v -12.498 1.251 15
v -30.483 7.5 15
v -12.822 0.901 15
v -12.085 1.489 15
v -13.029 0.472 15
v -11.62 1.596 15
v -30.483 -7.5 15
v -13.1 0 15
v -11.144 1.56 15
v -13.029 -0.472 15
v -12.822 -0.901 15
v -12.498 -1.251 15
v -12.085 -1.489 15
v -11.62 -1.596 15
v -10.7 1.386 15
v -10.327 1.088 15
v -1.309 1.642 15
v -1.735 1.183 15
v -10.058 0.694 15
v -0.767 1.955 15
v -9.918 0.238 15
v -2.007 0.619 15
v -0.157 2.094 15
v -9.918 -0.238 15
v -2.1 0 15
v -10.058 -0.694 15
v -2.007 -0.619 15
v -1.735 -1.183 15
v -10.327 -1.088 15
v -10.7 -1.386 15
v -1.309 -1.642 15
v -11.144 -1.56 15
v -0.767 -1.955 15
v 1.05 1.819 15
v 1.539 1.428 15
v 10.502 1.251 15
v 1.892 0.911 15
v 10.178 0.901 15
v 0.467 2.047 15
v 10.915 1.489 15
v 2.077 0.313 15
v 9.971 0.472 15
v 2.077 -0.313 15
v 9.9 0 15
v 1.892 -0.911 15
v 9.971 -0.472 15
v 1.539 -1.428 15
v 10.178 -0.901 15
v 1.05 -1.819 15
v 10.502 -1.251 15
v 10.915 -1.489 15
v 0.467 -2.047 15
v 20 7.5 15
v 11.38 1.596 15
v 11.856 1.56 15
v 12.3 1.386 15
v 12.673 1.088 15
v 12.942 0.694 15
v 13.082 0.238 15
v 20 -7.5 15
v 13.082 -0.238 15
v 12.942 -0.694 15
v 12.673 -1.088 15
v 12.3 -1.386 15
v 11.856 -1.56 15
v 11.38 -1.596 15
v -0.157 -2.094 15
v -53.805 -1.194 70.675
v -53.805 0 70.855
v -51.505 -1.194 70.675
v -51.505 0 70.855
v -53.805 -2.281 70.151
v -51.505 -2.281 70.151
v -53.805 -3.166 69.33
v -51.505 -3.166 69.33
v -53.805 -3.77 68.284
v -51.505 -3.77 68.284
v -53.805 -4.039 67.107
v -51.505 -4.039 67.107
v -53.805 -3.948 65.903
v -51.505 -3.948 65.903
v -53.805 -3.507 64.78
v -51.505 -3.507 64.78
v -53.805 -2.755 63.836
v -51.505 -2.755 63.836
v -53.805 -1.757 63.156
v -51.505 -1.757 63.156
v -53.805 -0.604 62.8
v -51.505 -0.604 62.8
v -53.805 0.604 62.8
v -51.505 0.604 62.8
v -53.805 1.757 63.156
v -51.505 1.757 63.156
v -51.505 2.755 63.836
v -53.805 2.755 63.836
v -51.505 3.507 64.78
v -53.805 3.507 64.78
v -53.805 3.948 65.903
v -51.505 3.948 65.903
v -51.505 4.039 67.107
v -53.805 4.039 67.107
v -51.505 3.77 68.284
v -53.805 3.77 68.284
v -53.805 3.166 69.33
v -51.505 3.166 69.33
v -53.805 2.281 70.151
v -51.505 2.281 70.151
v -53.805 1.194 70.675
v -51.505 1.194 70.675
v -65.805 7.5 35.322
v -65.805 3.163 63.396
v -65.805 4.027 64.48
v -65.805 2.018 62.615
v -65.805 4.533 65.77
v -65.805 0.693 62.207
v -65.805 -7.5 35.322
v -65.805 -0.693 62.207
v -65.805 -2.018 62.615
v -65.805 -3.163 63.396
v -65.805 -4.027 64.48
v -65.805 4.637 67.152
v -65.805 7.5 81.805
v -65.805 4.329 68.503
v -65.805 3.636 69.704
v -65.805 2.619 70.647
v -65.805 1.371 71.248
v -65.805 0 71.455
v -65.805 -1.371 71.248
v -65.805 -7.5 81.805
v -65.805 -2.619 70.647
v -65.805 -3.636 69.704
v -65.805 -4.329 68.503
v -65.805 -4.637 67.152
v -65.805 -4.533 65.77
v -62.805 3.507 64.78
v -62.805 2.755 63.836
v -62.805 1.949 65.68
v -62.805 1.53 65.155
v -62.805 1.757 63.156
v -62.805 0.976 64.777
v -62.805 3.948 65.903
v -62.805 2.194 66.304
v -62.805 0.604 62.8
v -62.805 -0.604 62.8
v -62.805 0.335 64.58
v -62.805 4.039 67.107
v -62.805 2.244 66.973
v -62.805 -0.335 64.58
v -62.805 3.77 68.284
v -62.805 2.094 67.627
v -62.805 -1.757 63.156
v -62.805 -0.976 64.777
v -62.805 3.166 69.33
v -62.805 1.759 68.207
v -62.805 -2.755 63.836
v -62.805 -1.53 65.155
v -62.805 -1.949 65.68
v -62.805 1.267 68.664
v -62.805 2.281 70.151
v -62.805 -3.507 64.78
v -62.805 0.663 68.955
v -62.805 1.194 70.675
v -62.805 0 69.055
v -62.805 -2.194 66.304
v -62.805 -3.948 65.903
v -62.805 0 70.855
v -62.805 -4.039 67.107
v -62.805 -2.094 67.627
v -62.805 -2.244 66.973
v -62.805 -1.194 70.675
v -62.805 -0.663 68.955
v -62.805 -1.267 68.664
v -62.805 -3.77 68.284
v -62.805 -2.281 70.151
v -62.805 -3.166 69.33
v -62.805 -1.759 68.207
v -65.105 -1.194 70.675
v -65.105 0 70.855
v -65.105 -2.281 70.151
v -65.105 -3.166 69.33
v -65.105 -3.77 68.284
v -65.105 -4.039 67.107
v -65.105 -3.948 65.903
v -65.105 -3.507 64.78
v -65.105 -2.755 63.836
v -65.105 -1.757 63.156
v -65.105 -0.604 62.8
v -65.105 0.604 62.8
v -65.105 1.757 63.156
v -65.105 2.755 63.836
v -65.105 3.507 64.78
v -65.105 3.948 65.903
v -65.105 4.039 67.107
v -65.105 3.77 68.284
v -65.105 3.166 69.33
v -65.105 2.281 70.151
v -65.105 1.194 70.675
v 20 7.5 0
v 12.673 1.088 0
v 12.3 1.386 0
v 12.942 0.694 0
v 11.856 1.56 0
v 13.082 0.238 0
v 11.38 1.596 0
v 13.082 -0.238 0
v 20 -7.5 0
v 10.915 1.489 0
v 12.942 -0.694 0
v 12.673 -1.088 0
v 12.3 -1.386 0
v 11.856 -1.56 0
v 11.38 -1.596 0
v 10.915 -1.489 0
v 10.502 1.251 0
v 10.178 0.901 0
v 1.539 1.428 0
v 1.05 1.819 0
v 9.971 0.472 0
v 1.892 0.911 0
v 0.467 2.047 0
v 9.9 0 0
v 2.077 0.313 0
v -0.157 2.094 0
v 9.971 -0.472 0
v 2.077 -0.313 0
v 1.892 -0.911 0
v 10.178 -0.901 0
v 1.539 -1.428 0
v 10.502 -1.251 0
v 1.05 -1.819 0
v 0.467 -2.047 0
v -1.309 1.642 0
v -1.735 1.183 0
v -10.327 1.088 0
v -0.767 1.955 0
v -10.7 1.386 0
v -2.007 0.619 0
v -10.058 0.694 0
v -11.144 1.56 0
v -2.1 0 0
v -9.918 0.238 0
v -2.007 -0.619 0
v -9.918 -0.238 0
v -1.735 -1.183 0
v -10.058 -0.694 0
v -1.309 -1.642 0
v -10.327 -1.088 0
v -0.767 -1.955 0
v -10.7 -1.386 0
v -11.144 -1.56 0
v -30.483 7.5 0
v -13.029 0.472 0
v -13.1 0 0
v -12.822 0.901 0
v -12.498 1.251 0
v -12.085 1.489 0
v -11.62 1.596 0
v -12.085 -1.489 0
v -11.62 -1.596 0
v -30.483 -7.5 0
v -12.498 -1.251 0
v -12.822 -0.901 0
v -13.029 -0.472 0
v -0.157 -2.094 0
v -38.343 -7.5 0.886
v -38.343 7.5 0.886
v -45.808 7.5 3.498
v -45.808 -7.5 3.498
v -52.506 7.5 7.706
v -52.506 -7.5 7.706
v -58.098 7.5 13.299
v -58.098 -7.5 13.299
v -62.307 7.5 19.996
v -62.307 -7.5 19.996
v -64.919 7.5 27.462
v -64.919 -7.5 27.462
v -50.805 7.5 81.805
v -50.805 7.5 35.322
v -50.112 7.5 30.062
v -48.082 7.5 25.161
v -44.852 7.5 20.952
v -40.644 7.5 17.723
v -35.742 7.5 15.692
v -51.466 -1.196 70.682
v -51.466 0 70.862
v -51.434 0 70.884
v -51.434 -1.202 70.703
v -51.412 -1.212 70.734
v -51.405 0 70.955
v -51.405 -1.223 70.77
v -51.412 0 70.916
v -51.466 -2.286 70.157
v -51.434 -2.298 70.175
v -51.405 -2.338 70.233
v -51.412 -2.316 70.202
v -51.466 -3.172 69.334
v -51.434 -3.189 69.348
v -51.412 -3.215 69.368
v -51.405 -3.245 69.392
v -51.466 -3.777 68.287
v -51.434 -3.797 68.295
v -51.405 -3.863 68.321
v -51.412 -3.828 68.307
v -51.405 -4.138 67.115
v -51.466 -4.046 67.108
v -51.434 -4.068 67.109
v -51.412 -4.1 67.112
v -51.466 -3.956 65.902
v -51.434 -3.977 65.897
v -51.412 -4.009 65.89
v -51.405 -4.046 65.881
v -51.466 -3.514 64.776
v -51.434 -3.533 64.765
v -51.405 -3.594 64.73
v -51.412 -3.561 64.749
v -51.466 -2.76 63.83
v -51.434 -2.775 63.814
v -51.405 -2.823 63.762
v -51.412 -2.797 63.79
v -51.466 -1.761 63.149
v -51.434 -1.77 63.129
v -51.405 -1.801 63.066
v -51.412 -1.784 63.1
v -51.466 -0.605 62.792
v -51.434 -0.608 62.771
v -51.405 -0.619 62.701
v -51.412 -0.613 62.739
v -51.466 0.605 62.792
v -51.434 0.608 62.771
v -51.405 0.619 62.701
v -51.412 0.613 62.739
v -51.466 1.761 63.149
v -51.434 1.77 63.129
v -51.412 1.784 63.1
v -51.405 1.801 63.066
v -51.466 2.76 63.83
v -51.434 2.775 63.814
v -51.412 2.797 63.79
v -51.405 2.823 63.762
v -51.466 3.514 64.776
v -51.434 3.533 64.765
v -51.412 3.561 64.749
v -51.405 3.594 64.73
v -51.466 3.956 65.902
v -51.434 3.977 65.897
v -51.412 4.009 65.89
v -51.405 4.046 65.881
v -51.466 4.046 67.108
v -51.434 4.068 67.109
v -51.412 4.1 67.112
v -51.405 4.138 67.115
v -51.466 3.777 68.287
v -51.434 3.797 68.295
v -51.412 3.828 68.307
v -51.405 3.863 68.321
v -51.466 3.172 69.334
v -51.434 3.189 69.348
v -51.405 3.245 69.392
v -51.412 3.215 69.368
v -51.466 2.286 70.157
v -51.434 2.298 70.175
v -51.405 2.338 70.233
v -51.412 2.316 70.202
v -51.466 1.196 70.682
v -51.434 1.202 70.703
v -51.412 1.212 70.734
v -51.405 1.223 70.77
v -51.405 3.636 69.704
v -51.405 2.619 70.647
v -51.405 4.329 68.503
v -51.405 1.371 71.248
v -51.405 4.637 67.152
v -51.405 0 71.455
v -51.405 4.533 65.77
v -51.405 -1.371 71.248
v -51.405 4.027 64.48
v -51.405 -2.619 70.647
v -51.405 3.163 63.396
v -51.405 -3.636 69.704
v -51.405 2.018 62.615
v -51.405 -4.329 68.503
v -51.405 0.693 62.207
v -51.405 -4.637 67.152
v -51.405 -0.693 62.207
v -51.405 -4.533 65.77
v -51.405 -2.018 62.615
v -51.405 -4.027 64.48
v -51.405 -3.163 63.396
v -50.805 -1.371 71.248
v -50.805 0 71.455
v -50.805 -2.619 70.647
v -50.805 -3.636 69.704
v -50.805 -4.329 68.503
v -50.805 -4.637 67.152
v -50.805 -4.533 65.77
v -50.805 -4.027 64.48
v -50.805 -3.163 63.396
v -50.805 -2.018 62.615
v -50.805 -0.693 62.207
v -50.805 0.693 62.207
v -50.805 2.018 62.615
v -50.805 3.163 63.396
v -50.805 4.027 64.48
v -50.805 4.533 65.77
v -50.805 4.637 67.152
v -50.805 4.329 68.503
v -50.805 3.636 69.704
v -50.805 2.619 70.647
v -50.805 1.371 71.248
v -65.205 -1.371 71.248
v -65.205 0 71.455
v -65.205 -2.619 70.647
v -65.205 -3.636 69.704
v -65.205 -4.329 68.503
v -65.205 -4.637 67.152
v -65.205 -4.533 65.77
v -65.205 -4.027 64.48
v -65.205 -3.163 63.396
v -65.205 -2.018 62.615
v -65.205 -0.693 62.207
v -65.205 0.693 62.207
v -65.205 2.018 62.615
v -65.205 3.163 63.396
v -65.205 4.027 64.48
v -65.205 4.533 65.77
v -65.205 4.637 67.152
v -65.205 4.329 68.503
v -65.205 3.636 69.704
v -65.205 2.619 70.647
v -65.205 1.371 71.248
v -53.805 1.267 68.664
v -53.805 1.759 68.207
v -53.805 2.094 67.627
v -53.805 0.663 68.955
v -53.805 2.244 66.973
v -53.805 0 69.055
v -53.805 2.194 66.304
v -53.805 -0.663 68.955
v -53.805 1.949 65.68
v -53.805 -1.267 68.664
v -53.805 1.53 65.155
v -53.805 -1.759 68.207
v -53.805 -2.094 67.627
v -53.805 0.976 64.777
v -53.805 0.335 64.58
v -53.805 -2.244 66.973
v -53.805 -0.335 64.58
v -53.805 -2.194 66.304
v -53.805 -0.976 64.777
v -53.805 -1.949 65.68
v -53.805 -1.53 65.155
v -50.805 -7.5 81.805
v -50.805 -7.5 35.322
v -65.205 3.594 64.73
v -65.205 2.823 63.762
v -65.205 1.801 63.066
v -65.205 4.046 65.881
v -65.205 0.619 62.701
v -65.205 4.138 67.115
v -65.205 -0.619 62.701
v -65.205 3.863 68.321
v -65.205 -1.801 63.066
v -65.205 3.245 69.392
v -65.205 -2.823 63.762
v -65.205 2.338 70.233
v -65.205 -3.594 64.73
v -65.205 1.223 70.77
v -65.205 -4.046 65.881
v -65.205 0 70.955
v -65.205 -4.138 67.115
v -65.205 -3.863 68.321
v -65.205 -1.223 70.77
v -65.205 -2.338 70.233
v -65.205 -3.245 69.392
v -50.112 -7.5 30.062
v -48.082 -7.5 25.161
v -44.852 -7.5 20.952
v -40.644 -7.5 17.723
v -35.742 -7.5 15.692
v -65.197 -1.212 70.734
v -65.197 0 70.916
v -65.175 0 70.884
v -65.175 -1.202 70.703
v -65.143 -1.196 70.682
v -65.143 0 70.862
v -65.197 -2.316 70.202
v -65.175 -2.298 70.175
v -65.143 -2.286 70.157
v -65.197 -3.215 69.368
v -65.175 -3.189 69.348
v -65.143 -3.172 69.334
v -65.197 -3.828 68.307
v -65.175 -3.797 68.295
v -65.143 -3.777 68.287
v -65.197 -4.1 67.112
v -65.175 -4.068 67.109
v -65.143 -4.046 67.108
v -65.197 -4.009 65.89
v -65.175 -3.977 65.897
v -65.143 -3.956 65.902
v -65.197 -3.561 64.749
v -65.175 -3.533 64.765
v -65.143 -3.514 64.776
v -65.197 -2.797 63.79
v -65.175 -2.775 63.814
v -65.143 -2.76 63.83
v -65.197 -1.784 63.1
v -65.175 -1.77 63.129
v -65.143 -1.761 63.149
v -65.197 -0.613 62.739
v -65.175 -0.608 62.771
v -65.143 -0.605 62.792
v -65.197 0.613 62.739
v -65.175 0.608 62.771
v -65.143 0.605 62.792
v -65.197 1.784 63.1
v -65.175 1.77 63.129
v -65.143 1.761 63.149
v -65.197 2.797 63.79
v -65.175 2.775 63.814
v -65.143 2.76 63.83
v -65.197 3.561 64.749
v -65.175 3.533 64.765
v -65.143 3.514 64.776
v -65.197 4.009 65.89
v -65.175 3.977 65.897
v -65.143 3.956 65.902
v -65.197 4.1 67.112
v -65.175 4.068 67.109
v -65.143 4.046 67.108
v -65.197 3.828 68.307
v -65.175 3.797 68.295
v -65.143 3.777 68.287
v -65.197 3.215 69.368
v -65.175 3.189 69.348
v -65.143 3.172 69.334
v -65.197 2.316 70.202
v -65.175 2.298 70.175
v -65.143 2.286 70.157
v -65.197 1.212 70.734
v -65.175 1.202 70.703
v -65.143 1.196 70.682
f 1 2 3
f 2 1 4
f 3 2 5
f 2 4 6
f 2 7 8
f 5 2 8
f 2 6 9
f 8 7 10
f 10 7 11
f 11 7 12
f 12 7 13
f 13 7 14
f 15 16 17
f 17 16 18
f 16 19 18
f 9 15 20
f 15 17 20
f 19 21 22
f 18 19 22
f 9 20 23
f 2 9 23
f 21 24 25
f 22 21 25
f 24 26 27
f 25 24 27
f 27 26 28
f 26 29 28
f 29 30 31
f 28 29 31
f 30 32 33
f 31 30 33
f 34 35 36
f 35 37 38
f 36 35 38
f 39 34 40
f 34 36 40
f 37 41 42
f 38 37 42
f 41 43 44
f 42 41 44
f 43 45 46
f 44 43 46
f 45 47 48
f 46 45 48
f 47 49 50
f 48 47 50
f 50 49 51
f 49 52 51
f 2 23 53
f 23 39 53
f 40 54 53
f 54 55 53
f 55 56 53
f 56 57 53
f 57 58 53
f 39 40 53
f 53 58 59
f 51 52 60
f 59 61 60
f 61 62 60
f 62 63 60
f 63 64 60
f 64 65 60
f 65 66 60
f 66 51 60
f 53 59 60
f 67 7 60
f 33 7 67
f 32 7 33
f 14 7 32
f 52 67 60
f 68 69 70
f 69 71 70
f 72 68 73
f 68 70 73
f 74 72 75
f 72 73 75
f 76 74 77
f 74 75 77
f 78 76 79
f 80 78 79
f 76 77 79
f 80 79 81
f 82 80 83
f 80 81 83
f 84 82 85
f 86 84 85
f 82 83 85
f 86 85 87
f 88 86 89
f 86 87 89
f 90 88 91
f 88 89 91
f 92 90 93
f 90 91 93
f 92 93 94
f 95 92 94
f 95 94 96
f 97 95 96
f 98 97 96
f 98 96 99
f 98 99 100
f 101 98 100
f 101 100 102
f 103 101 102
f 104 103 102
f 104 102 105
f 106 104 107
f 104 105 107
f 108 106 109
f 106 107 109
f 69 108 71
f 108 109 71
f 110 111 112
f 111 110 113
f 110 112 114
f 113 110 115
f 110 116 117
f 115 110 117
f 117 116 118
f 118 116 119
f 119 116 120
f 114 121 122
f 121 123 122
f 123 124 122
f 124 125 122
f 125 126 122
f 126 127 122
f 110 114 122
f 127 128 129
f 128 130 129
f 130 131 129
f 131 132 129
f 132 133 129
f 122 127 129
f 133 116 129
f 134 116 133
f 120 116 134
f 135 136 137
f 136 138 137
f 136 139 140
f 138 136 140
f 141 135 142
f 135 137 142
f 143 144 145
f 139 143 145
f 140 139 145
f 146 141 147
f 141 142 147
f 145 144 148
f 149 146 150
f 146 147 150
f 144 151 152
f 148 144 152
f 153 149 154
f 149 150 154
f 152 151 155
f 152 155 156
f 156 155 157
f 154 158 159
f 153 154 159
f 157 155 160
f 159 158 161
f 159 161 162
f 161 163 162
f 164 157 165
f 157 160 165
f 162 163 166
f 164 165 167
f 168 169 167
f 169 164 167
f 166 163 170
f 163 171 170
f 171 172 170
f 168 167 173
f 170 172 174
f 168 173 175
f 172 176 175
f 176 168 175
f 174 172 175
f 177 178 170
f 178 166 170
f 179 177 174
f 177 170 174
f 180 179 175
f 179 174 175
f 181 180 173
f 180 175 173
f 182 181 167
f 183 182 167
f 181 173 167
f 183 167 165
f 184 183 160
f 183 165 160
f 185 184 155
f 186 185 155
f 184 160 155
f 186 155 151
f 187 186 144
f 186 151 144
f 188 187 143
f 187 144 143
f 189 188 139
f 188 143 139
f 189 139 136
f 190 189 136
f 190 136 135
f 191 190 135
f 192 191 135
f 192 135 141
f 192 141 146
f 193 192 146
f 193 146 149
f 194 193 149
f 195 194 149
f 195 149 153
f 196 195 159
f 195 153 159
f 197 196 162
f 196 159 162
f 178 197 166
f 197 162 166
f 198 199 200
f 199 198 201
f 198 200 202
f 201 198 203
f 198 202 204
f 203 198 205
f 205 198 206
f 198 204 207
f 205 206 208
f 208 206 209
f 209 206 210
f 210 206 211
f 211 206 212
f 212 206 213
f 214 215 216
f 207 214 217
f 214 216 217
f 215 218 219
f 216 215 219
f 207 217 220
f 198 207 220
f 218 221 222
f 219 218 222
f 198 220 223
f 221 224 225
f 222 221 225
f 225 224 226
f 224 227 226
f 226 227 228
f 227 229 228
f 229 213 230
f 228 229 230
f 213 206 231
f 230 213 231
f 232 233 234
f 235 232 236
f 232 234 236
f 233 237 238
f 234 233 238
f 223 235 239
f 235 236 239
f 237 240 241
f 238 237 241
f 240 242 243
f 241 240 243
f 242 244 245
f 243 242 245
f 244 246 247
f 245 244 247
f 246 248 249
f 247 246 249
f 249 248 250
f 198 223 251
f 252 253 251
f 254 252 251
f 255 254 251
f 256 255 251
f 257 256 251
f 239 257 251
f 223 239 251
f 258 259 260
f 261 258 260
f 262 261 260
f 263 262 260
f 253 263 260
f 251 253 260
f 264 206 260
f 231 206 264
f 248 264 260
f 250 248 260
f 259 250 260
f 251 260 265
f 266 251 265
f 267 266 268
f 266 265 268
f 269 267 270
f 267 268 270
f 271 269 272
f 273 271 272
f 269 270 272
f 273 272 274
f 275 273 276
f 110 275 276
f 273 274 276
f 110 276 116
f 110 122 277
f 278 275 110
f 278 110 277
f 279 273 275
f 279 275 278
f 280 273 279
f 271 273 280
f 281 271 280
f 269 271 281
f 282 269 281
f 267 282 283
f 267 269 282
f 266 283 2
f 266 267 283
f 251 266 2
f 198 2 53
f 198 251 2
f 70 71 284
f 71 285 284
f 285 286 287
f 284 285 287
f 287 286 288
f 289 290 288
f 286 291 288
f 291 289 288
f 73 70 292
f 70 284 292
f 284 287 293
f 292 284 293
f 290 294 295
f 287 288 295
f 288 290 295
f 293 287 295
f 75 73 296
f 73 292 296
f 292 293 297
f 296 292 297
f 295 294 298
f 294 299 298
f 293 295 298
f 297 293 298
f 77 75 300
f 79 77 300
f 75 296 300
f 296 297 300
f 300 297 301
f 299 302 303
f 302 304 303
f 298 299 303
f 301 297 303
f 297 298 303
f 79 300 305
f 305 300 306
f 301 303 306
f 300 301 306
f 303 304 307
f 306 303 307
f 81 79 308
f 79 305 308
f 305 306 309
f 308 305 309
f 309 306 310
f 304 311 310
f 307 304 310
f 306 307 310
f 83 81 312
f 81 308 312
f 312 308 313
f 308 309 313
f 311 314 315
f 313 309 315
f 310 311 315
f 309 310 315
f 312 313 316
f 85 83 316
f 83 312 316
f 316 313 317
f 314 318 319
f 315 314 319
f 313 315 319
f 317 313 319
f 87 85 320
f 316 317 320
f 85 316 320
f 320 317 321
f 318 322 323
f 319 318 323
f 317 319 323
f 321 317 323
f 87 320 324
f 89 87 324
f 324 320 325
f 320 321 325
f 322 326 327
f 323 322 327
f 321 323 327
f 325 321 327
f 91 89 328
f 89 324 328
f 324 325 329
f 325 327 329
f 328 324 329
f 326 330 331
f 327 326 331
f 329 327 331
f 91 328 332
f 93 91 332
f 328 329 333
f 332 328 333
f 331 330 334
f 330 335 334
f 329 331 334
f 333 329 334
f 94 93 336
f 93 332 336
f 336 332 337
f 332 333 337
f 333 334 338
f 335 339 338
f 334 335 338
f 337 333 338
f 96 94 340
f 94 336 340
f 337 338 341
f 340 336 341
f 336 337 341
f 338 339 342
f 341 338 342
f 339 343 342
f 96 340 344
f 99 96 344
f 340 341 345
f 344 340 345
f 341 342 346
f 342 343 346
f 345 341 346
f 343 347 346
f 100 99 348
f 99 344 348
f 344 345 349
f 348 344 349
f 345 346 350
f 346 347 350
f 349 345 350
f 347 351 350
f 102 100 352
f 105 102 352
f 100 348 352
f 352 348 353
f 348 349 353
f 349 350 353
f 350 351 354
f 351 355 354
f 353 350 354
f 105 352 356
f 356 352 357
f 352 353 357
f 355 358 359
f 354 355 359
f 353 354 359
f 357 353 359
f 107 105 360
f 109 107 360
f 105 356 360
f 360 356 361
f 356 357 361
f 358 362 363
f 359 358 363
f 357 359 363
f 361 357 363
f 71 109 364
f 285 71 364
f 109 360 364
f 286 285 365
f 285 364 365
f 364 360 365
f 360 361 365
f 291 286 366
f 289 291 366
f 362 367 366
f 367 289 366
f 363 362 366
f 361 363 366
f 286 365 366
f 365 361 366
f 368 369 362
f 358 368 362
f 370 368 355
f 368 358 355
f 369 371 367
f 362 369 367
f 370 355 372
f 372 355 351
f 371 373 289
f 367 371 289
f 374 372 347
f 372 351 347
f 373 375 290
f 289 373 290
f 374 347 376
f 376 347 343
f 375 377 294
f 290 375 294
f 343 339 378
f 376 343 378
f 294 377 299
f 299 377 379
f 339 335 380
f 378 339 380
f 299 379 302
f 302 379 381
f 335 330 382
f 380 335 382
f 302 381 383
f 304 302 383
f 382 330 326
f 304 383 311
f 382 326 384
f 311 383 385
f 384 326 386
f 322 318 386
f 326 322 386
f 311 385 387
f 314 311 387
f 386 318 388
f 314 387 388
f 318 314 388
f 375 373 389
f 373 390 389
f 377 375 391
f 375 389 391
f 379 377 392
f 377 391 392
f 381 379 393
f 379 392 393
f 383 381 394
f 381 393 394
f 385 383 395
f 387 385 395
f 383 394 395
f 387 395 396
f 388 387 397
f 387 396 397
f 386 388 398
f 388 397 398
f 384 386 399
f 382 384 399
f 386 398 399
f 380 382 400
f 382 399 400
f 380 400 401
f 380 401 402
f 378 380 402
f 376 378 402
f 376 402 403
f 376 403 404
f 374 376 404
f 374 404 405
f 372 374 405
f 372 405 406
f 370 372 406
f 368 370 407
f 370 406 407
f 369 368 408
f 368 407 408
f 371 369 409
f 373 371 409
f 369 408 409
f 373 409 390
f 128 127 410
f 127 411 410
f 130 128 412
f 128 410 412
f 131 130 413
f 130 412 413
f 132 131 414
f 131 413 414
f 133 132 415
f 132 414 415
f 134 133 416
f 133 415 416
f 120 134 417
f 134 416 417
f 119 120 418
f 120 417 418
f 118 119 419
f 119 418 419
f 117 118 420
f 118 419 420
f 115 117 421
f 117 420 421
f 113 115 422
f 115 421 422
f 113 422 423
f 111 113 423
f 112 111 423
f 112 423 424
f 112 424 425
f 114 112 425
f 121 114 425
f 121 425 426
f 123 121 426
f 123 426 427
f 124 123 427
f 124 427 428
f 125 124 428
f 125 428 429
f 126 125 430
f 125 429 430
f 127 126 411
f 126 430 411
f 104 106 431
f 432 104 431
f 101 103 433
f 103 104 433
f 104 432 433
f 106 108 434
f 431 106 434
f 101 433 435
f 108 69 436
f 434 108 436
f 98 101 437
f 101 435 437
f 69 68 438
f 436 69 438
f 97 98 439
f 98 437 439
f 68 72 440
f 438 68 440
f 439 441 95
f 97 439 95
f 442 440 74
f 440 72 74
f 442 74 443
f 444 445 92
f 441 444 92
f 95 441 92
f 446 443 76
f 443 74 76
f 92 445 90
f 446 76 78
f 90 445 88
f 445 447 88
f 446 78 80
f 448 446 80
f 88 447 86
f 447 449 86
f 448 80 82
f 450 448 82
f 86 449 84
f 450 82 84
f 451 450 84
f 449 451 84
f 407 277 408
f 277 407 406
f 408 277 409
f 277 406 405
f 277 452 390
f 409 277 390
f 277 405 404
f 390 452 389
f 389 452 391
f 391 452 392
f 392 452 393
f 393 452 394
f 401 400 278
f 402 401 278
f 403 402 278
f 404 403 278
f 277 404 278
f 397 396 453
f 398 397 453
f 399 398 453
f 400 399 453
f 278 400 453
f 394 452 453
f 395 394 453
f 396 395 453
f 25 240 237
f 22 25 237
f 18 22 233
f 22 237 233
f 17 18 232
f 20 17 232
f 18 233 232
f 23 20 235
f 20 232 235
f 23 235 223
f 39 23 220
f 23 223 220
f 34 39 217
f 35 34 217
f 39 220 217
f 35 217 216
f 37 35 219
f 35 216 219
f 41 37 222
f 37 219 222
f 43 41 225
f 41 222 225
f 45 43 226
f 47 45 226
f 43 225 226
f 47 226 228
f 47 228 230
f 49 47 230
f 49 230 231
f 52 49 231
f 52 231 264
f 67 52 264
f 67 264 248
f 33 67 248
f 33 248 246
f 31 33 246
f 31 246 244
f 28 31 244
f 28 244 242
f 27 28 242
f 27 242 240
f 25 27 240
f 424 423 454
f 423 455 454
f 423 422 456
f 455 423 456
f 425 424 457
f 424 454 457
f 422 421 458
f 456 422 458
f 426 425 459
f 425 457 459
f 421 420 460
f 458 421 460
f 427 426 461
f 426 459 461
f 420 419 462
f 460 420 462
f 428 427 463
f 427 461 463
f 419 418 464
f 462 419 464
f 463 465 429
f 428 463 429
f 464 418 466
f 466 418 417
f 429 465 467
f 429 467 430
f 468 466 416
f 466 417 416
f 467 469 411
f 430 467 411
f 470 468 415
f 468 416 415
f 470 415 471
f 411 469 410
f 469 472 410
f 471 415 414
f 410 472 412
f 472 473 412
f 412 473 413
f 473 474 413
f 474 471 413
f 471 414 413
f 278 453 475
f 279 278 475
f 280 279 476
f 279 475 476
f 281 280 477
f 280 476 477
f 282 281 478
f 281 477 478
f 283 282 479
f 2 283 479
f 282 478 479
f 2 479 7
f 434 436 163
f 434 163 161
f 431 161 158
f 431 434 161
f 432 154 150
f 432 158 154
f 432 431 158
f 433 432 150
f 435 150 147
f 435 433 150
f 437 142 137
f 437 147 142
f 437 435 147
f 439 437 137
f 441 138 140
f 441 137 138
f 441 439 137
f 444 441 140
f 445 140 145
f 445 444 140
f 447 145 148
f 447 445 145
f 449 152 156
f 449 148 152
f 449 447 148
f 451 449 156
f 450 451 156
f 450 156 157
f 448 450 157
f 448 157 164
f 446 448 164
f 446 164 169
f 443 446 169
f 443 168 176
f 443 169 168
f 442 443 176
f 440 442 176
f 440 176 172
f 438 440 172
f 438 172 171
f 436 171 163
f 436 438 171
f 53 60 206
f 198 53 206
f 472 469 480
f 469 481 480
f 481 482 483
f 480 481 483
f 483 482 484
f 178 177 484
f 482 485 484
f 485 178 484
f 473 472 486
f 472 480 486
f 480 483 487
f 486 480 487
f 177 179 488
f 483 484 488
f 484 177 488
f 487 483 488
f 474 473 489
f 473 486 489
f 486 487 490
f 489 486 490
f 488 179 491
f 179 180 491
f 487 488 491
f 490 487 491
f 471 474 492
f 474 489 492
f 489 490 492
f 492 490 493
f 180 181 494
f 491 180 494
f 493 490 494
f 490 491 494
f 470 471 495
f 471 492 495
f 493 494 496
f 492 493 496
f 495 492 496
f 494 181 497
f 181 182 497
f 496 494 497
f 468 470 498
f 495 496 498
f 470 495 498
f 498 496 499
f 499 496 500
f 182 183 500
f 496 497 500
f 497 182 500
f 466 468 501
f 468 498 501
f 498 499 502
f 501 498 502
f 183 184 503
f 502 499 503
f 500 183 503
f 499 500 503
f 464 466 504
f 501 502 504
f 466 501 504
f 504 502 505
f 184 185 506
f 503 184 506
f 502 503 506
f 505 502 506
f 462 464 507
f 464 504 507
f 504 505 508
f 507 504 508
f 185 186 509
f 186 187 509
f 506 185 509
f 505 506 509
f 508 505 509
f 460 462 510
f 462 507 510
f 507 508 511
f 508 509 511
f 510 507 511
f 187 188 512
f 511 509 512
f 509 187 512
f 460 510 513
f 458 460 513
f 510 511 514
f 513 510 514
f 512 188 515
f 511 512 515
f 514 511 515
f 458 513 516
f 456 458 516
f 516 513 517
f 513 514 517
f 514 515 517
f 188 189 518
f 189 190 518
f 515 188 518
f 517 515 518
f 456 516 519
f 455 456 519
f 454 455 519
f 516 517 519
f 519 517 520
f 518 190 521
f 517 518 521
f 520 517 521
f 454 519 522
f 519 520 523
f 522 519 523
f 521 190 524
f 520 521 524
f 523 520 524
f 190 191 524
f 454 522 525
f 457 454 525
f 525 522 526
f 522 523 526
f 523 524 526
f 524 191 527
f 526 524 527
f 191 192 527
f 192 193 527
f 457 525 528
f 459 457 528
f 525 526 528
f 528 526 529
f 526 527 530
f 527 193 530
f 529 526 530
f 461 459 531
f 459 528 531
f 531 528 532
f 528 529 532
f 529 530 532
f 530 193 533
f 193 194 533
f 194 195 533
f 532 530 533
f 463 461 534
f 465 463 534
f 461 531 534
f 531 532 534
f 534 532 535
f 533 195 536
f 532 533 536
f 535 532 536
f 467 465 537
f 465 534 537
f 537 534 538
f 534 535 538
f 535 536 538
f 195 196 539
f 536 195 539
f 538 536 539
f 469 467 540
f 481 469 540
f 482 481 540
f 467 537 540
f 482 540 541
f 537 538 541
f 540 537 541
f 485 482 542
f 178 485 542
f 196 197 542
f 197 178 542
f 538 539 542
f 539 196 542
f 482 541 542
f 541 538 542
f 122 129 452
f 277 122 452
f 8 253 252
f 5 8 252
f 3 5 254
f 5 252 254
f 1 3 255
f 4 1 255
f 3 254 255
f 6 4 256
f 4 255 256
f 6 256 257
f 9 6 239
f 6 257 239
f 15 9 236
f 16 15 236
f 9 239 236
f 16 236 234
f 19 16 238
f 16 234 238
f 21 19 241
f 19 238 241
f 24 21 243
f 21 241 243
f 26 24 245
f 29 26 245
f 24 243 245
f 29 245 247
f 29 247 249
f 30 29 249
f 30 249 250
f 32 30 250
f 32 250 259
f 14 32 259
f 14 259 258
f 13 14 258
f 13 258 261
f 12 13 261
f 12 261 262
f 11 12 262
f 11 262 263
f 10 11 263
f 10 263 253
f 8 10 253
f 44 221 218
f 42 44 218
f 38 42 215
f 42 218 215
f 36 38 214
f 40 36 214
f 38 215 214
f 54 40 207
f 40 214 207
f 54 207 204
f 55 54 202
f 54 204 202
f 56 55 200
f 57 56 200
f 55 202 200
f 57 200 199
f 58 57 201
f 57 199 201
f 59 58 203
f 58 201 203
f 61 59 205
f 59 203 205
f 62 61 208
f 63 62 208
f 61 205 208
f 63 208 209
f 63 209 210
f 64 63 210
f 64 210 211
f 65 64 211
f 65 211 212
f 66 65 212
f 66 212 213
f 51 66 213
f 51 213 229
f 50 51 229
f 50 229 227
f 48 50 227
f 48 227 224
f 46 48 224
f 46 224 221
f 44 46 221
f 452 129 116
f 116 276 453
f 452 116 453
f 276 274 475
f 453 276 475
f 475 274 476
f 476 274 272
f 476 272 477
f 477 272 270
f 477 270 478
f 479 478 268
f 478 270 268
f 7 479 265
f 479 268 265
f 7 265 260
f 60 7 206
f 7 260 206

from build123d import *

# Parameters (mm, degrees)
BOSS_EXTRUDE1_DEPTH      = 7.5
BOSS_EXTRUDE1_DEPTH_BACK = 7.5
CUT_EXTRUDE1_DEPTH       = 109.450580006
CUT_EXTRUDE1_DEPTH_BACK  = 109.450580006
SKETCH2_R                = 2.25
SKETCH3_R                = 2.1
SKETCH3_R_2              = 1.6
CUT_EXTRUDE2_DEPTH       = 106.254370403


with BuildPart() as part:
    # Sketch1 → Boss-Extrude1 (new, two sides: drawn at the far end of the back side and taken through both)
    with BuildSketch(Plane(origin=(0, 0, 0), x_dir=(1, 0, 0), z_dir=(0, 1, 0)).offset(-BOSS_EXTRUDE1_DEPTH_BACK)):
        with BuildLine():
            Line((-65.80458146, -35.321832584), (-65.80458146, -81.80458146))
            Line((-65.80458146, -81.80458146), (-50.80458146, -81.80458146))
            Line((-50.80458146, -81.80458146), (-50.80458146, -35.321832584))
            ThreePointArc((-50.80458146, -35.321832584), (-44.852454502, -20.952126958), (-30.482748876, -15))
            Line((-30.482748876, -15), (20, -15))
            Line((20, -15), (20, 0))
            Line((20, 0), (-30.482748876, 0))
            ThreePointArc((-30.482748876, 0), (-55.45905622, -10.34552524), (-65.80458146, -35.321832584))
        make_face()
    extrude(amount=BOSS_EXTRUDE1_DEPTH + BOSS_EXTRUDE1_DEPTH_BACK)

    # Sketch2 → Cut-Extrude1 (cut, two sides: drawn at the far end of the back side and taken through both)
    with BuildSketch(Plane.ZY.offset(50.80458146).offset(-CUT_EXTRUDE1_DEPTH_BACK)):
        with Locations((66.80458146, 0)):
            Circle(SKETCH2_R)
    extrude(amount=CUT_EXTRUDE1_DEPTH + CUT_EXTRUDE1_DEPTH_BACK, mode=Mode.SUBTRACT)

    # Sketch3 → Cut-Extrude2 (cut, through all)
    with BuildSketch(Plane(origin=(0, 0, 0), x_dir=(-1, 0, 0), z_dir=(0, 0, -1))):
        Circle(SKETCH3_R)
        with Locations((-11.5, 0)):
            Circle(SKETCH3_R_2)
        with Locations((11.5, 0)):
            Circle(SKETCH3_R_2)
    extrude(amount=-CUT_EXTRUDE2_DEPTH, mode=Mode.SUBTRACT)

    # Sketch5 → bearing-seats (revolve, cut)
    with BuildSketch(Plane(origin=(0, 0, 0), x_dir=(1, 0, 0), z_dir=(0, 1, 0))):
        with BuildLine():
            Line((-65.80458146, -71.45458146), (-65.20458146, -71.45458146))
            Line((-65.20458146, -71.45458146), (-65.20458146, -70.95458146))
            ThreePointArc((-65.20458146, -70.95458146), (-65.175292138, -70.883870782), (-65.10458146, -70.85458146))
            Line((-65.10458146, -70.85458146), (-62.80458146, -70.85458146))
            Line((-62.80458146, -70.85458146), (-62.80458146, -66.80458146))
            Line((-62.80458146, -66.80458146), (-65.80458146, -66.80458146))
            Line((-65.80458146, -66.80458146), (-65.80458146, -71.45458146))
        make_face()
        with BuildLine():
            Line((-50.80458146, -66.80458146), (-53.80458146, -66.80458146))
            Line((-53.80458146, -66.80458146), (-53.80458146, -70.85458146))
            Line((-53.80458146, -70.85458146), (-51.50458146, -70.85458146))
            ThreePointArc((-51.50458146, -70.85458146), (-51.433870782, -70.883870782), (-51.40458146, -70.95458146))
            Line((-51.40458146, -70.95458146), (-51.40458146, -71.45458146))
            Line((-51.40458146, -71.45458146), (-50.80458146, -71.45458146))
            Line((-50.80458146, -71.45458146), (-50.80458146, -66.80458146))
        make_face()
    revolve(axis=Axis((-84.392341333, 0, 66.80458146), (1, 0, 0)), mode=Mode.SUBTRACT)


solid = part.part
